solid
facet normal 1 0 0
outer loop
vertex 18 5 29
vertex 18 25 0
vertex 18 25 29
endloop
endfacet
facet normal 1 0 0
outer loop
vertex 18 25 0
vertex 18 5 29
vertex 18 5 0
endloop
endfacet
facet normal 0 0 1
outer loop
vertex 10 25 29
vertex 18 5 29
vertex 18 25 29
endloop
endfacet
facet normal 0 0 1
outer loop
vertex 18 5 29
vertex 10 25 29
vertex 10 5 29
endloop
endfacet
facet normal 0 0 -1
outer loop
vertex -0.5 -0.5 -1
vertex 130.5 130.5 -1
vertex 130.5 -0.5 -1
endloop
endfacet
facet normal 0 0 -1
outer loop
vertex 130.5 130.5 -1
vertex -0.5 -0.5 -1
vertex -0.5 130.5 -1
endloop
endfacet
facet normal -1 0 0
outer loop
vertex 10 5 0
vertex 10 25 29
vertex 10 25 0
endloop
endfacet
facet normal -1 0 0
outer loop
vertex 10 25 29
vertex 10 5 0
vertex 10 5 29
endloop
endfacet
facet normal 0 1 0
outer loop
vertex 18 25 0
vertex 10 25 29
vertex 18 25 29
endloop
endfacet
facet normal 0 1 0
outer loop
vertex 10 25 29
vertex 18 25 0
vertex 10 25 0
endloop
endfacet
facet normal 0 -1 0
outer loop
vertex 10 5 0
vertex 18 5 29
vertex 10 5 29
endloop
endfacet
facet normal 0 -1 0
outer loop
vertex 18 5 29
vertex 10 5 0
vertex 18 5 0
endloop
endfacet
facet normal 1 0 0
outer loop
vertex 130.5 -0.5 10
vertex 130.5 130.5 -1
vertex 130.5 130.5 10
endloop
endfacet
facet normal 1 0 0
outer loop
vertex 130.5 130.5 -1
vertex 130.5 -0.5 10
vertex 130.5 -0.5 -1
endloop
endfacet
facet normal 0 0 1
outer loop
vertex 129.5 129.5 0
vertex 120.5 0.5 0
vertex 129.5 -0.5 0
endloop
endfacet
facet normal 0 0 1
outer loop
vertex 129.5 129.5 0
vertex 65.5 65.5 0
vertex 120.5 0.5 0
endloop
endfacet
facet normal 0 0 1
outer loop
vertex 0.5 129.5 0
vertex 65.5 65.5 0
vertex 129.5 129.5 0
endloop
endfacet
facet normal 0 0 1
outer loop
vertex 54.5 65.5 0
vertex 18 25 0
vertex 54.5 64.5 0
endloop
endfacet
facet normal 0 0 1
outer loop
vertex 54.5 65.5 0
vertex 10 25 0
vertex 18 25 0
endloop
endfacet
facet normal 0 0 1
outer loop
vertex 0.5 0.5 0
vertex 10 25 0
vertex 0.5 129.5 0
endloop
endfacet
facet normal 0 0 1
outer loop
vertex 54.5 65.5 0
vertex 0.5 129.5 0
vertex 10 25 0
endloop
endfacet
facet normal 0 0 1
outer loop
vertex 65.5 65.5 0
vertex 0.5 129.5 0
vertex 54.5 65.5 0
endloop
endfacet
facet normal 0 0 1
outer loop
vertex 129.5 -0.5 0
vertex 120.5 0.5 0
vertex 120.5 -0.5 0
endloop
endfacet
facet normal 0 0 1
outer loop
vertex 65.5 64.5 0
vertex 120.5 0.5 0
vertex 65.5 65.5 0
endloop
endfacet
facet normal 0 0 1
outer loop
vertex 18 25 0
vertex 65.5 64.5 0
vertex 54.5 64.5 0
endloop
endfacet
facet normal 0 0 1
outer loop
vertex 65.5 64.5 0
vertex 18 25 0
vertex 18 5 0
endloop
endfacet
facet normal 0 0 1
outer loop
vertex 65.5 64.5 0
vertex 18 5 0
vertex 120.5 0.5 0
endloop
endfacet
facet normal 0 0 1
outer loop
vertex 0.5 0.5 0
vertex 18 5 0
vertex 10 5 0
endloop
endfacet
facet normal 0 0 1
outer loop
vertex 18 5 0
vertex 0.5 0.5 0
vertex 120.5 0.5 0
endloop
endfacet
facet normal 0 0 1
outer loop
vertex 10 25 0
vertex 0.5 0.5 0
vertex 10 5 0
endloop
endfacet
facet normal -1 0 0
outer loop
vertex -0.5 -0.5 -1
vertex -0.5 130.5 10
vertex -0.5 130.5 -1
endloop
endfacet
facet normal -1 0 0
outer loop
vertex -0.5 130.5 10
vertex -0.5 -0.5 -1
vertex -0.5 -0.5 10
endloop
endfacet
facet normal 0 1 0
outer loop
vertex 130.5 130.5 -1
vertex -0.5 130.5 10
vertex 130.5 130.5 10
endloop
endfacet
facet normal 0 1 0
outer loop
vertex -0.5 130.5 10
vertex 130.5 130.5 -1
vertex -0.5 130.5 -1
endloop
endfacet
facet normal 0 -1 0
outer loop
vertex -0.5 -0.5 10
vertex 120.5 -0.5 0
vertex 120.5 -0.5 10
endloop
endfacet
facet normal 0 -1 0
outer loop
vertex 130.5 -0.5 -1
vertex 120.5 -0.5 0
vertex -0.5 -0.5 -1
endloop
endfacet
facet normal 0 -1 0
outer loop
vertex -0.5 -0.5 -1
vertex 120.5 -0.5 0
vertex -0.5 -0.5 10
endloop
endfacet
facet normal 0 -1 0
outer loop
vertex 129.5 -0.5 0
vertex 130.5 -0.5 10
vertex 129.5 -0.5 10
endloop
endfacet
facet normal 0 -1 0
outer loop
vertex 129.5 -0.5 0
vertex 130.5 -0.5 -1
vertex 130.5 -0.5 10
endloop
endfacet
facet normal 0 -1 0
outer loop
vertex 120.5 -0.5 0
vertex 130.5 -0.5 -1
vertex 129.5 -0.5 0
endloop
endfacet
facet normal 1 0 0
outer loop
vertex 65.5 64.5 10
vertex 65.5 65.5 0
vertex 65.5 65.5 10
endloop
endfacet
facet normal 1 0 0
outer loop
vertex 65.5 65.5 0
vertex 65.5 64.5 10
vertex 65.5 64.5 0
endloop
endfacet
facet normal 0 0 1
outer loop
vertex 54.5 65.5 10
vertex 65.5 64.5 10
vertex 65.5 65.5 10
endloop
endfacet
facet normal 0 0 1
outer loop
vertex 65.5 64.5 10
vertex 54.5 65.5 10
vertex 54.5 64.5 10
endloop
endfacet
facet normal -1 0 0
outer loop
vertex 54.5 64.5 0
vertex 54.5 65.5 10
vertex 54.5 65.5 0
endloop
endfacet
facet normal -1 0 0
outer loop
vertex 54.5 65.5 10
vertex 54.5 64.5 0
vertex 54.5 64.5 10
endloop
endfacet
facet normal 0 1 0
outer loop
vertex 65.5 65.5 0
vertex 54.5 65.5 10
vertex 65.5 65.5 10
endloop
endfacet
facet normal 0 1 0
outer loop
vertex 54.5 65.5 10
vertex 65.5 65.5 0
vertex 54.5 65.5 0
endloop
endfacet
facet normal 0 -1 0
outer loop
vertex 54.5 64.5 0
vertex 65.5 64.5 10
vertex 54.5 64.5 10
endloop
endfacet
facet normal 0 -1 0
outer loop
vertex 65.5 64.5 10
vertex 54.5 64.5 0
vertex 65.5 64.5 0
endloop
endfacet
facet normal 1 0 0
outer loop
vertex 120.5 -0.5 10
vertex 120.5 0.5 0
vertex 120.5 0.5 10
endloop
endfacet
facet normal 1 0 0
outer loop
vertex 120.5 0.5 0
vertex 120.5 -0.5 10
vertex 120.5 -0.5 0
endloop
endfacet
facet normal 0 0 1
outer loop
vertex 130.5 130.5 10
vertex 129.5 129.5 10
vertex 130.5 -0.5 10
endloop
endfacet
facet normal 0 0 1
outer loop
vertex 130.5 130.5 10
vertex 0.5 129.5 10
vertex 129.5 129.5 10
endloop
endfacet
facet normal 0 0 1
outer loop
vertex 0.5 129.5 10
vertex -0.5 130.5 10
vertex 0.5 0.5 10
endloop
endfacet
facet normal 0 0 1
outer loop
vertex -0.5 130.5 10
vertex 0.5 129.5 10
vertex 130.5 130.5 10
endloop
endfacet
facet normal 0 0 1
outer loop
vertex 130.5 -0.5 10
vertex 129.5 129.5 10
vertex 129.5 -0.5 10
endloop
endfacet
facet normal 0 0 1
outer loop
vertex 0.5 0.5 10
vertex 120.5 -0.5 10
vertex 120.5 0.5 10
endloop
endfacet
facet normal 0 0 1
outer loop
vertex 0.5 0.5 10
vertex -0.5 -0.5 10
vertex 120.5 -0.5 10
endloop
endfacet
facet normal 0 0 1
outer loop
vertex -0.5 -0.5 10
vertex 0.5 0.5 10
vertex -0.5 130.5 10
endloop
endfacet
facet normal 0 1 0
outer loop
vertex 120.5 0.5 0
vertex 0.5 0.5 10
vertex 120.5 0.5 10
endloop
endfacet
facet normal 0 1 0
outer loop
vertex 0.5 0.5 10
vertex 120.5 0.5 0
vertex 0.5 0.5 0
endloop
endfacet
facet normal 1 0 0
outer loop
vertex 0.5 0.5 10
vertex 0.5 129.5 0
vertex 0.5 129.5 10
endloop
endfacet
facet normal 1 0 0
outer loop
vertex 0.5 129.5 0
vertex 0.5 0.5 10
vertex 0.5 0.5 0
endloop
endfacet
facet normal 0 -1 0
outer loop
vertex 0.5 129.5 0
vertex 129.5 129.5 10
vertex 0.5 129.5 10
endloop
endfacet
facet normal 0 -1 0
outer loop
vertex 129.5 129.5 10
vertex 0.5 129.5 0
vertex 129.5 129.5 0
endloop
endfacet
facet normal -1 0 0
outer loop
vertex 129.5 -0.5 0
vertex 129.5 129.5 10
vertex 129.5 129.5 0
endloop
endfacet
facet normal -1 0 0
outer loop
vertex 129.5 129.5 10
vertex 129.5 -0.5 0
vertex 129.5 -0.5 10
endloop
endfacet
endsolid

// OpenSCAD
translate([10,5,-1]){
cube([8,20,30]);
    }
    
translate([-0.5,-0.5,-1]){
cube([131,131,1], center=false);
}
translate([60.0,65.0,5.0]){
//rotate([0,0,90]){
cube([11,1,10], center=true);
}
//}

// borders
translate([-0.5,-0.5,0]){
cube([121,1,10], center=false);
}
translate([-0.5,-0.5,0]){
cube([1,131,10], center=false);
}
translate([-0.5,129.5,0]){
cube([131,1,10], center=false);
}
translate([129.5,-0.5,0]){
cube([1,131,10], center=false);
}
